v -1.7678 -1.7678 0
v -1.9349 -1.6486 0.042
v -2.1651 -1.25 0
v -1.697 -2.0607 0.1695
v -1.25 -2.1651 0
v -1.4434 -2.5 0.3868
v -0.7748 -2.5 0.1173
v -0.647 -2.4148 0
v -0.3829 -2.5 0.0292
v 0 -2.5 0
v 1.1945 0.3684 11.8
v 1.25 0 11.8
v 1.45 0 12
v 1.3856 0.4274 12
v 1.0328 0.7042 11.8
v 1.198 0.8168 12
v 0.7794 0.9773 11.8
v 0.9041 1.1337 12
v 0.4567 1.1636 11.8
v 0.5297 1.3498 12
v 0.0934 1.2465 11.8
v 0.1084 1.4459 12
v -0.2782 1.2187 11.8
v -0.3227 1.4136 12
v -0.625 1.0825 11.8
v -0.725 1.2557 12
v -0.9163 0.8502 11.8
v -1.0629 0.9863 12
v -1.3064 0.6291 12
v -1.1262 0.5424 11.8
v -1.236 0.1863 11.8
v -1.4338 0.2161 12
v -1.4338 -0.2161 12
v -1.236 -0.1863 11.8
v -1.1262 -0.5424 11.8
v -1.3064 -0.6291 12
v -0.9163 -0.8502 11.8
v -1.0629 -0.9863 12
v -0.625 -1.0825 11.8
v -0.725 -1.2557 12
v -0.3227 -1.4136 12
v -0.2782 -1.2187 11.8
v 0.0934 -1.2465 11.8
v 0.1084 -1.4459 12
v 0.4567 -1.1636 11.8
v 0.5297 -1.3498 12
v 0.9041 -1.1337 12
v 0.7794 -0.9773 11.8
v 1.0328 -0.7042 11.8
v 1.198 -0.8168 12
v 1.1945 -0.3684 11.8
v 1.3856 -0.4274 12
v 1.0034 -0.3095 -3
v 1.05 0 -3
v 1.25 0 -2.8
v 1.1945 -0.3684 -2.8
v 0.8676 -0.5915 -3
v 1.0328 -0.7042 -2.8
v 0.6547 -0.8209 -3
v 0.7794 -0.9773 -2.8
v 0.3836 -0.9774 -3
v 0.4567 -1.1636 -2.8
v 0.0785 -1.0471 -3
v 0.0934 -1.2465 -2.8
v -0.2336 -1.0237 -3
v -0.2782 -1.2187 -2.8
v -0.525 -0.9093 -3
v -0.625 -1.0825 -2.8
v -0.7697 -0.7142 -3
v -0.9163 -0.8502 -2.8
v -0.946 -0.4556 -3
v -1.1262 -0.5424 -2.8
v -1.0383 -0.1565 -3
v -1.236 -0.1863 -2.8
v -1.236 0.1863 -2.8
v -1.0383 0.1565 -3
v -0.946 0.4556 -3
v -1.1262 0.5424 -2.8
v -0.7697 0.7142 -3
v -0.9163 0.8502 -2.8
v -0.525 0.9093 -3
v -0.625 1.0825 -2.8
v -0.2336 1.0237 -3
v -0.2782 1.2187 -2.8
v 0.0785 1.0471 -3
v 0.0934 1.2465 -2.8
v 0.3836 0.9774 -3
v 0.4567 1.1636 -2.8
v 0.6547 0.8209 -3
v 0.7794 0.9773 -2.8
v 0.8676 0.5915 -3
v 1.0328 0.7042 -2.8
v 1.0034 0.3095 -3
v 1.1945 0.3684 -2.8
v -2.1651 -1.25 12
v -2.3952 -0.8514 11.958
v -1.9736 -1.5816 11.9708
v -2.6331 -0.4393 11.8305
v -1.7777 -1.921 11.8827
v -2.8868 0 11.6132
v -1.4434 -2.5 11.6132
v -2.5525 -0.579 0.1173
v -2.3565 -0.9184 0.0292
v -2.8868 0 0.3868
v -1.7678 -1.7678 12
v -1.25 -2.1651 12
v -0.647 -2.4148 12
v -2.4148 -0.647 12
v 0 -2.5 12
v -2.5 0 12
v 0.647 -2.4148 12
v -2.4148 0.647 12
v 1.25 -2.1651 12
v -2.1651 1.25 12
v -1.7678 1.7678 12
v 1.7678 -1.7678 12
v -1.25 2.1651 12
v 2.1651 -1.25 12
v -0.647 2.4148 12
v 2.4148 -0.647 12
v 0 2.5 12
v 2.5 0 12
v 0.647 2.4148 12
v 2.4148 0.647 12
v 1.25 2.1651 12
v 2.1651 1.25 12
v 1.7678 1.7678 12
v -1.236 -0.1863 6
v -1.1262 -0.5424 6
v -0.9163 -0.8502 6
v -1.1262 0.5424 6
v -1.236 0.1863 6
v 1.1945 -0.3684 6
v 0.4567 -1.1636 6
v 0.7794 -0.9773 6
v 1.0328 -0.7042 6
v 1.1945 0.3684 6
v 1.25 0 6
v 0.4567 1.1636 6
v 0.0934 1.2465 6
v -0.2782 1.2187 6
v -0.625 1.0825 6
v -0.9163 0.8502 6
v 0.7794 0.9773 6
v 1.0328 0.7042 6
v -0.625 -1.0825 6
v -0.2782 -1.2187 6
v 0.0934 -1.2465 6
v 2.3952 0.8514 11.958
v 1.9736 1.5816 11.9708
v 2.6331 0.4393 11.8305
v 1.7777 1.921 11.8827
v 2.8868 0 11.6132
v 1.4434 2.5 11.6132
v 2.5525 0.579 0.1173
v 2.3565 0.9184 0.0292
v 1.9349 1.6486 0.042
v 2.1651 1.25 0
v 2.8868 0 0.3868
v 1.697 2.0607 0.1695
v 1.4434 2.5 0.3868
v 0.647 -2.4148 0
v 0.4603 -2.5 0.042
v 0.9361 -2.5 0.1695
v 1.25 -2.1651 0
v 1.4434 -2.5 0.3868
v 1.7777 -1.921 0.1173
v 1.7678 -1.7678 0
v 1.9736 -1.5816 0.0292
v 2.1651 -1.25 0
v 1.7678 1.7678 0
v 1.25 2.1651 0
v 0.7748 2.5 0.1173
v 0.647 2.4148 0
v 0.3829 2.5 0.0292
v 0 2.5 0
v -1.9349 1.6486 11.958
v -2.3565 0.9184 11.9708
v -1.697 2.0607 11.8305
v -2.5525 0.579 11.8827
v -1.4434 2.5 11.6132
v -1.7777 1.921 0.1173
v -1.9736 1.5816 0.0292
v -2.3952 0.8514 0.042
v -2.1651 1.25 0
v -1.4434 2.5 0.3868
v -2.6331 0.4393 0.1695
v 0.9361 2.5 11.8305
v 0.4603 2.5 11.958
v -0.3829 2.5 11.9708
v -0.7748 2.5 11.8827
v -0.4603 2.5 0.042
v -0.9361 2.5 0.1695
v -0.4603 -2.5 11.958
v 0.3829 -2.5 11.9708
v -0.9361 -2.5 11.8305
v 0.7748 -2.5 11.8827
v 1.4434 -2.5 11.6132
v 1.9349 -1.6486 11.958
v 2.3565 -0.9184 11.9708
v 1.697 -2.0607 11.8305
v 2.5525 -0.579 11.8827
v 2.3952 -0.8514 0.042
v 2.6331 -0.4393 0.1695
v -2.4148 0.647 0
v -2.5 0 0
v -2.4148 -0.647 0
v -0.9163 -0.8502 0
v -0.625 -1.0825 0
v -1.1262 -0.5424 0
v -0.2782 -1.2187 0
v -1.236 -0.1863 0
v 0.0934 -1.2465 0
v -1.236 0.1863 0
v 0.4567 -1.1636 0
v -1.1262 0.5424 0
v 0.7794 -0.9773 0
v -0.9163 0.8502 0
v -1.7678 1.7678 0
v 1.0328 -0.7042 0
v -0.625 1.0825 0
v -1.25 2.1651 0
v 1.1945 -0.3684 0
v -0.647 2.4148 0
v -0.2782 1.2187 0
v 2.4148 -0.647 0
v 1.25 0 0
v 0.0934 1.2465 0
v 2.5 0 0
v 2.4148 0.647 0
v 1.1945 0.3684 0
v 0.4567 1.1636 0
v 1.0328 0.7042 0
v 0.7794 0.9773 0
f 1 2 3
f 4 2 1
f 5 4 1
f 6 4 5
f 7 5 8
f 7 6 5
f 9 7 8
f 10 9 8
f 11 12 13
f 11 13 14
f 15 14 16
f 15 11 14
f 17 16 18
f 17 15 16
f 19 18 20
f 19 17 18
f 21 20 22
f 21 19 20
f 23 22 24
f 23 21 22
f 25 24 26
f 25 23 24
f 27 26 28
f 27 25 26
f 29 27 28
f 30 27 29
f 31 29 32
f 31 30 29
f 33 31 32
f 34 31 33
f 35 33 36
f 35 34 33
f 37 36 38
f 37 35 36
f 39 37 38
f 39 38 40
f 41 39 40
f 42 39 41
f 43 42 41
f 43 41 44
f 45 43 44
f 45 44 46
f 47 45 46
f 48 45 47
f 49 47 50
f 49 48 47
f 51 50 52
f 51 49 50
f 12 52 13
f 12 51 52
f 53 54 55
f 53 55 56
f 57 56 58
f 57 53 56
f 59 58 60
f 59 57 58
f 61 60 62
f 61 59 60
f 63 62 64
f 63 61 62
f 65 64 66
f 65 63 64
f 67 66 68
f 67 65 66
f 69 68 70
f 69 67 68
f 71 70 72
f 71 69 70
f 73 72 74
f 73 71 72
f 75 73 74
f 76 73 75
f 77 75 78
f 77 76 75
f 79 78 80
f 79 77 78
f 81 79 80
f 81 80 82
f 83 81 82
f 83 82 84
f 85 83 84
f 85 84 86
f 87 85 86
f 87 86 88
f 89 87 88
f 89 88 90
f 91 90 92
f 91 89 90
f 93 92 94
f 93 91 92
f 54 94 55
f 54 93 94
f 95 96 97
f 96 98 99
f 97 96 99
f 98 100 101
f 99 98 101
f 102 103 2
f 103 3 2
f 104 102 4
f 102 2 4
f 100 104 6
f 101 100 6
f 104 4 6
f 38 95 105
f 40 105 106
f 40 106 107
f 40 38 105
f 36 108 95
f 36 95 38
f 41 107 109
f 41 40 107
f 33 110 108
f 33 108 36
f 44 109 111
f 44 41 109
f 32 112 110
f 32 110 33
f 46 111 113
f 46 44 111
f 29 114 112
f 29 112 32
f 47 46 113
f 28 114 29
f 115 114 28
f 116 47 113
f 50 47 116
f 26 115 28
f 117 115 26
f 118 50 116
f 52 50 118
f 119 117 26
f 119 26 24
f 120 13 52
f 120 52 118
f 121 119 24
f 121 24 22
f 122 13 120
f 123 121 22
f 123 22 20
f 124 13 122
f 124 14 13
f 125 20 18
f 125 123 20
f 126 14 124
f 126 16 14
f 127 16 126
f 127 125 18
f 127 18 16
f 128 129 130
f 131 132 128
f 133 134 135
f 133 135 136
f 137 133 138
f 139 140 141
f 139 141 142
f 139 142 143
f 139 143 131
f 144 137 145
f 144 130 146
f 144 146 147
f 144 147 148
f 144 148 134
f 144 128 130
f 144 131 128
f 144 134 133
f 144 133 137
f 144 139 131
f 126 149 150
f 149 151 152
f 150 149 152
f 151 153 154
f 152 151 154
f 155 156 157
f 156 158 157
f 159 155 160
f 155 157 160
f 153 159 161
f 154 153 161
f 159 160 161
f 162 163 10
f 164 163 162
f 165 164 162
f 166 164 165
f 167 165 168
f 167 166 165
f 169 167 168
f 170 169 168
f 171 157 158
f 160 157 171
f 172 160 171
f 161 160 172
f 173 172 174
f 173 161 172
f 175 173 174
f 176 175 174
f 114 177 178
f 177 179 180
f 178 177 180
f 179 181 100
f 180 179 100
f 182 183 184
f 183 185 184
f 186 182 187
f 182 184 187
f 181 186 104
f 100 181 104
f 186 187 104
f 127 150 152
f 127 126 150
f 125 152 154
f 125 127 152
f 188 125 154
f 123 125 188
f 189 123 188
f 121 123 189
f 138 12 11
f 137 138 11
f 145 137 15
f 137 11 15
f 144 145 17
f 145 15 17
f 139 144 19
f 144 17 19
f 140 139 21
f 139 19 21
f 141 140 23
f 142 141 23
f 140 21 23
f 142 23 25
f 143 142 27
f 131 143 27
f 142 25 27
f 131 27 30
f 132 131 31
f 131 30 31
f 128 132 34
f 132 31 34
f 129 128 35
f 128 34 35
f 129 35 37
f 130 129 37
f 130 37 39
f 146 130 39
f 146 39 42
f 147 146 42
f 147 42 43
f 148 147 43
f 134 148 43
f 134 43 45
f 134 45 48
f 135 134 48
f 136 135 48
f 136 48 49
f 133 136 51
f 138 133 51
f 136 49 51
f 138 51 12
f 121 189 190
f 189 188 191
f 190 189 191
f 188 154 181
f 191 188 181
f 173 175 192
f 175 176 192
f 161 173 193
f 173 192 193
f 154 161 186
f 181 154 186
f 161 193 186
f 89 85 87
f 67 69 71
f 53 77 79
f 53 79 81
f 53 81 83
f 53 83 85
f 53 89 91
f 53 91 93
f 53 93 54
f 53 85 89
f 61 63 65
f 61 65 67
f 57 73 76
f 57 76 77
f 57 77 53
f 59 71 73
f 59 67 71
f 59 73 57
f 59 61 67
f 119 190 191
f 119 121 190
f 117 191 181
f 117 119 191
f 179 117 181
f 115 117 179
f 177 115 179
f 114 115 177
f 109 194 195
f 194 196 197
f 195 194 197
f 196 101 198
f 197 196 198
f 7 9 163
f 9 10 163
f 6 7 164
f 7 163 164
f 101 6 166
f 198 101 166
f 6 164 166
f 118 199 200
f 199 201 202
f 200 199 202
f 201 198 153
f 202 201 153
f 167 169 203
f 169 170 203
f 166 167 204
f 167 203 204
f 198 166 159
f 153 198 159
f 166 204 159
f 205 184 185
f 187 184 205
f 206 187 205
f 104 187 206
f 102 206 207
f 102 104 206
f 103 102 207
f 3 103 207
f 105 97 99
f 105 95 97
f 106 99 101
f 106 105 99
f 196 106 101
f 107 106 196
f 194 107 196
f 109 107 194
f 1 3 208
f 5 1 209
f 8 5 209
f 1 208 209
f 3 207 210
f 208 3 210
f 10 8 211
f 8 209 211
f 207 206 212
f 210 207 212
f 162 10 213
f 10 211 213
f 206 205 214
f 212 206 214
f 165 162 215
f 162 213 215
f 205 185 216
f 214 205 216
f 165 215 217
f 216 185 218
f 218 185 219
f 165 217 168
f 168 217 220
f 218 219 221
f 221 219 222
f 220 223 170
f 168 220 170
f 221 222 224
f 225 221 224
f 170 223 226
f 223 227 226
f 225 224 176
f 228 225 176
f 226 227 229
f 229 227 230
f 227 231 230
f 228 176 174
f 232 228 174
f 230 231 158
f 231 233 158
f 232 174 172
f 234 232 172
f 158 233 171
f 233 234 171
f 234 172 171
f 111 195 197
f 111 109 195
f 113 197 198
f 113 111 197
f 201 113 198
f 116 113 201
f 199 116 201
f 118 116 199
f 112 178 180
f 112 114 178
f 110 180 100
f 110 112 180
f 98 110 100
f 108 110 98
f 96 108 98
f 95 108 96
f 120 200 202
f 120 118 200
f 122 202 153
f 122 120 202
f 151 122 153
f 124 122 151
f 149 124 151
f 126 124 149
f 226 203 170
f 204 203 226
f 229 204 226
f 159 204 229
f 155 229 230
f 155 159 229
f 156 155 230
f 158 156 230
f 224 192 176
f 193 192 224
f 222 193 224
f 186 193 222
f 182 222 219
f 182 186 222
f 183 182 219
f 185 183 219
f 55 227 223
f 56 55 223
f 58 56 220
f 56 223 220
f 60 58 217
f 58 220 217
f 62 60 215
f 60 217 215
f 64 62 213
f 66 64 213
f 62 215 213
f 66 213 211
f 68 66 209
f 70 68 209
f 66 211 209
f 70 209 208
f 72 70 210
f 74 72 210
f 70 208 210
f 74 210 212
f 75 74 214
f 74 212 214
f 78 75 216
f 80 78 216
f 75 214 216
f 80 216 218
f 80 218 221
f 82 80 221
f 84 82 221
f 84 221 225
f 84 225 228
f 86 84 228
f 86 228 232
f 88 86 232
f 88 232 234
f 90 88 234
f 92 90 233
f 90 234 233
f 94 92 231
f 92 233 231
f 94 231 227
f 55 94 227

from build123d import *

# Parameters (mm, degrees)
BOSS_EXTRU_1_DEPTH      = 12
ESQUISSE3_R             = 1.25
ENL_V_MAT_EXTRU_1_DEPTH = 6
CHANFREIN1_SIZE         = 0.2
ESQUISSE4_R             = 1.25
BOSS_EXTRU_2_DEPTH      = 3
CHANFREIN2_SIZE         = 0.2


with BuildPart() as part:
    # Esquisse1 → Boss.-Extru.1 (new body)
    with BuildSketch(Plane.XY):
        Polygon((2.886751346, 0), (1.443375673, 2.5), (-1.443375673, 2.5), (-2.886751346, 0), (-1.443375673, -2.5), (1.443375673, -2.5), align=None)
    extrude(amount=BOSS_EXTRU_1_DEPTH)

    # Esquisse2 → Enlèvement de matière-Révolution1 (revolve, cut)
    with BuildSketch(Plane(origin=(0, 0, 0), x_dir=(1, 0, 0), z_dir=(0, 1, 0))):
        Polygon((-1.5, 1), (-3, -0.5), (-3, 1), align=None)
        Polygon((-3, -11.5), (-1.5, -13), (-3, -13), align=None)
    revolve(axis=Axis((0, 0, 0), (0, 0, 1)), mode=Mode.SUBTRACT)

    # Esquisse3 → Enlèv. mat.-Extru.1 (cut)
    with BuildSketch(Plane.XY.offset(12)):
        Circle(ESQUISSE3_R)
    extrude(amount=-ENL_V_MAT_EXTRU_1_DEPTH, mode=Mode.SUBTRACT)

    # Chanfrein1
    chanfrein1_edges = [part.edges().sort_by_distance(p)[0] for p in [
        (-1.25, 0, 12),
    ]]
    chamfer(chanfrein1_edges, length=CHANFREIN1_SIZE)

    # Esquisse4 → Boss.-Extru.2 (add)
    with BuildSketch(Plane(origin=(0, 0, 0), x_dir=(-1, 0, 0), z_dir=(0, 0, -1))):
        with Locations(Location((0, 0, 0), (0, 0, 180))):
            Circle(ESQUISSE4_R)
    extrude(amount=BOSS_EXTRU_2_DEPTH)

    # Chanfrein2
    chanfrein2_edges = [part.edges().sort_by_distance(p)[0] for p in [
        (-1.25, 0, -3),
    ]]
    chamfer(chanfrein2_edges, length=CHANFREIN2_SIZE)


solid = part.part
